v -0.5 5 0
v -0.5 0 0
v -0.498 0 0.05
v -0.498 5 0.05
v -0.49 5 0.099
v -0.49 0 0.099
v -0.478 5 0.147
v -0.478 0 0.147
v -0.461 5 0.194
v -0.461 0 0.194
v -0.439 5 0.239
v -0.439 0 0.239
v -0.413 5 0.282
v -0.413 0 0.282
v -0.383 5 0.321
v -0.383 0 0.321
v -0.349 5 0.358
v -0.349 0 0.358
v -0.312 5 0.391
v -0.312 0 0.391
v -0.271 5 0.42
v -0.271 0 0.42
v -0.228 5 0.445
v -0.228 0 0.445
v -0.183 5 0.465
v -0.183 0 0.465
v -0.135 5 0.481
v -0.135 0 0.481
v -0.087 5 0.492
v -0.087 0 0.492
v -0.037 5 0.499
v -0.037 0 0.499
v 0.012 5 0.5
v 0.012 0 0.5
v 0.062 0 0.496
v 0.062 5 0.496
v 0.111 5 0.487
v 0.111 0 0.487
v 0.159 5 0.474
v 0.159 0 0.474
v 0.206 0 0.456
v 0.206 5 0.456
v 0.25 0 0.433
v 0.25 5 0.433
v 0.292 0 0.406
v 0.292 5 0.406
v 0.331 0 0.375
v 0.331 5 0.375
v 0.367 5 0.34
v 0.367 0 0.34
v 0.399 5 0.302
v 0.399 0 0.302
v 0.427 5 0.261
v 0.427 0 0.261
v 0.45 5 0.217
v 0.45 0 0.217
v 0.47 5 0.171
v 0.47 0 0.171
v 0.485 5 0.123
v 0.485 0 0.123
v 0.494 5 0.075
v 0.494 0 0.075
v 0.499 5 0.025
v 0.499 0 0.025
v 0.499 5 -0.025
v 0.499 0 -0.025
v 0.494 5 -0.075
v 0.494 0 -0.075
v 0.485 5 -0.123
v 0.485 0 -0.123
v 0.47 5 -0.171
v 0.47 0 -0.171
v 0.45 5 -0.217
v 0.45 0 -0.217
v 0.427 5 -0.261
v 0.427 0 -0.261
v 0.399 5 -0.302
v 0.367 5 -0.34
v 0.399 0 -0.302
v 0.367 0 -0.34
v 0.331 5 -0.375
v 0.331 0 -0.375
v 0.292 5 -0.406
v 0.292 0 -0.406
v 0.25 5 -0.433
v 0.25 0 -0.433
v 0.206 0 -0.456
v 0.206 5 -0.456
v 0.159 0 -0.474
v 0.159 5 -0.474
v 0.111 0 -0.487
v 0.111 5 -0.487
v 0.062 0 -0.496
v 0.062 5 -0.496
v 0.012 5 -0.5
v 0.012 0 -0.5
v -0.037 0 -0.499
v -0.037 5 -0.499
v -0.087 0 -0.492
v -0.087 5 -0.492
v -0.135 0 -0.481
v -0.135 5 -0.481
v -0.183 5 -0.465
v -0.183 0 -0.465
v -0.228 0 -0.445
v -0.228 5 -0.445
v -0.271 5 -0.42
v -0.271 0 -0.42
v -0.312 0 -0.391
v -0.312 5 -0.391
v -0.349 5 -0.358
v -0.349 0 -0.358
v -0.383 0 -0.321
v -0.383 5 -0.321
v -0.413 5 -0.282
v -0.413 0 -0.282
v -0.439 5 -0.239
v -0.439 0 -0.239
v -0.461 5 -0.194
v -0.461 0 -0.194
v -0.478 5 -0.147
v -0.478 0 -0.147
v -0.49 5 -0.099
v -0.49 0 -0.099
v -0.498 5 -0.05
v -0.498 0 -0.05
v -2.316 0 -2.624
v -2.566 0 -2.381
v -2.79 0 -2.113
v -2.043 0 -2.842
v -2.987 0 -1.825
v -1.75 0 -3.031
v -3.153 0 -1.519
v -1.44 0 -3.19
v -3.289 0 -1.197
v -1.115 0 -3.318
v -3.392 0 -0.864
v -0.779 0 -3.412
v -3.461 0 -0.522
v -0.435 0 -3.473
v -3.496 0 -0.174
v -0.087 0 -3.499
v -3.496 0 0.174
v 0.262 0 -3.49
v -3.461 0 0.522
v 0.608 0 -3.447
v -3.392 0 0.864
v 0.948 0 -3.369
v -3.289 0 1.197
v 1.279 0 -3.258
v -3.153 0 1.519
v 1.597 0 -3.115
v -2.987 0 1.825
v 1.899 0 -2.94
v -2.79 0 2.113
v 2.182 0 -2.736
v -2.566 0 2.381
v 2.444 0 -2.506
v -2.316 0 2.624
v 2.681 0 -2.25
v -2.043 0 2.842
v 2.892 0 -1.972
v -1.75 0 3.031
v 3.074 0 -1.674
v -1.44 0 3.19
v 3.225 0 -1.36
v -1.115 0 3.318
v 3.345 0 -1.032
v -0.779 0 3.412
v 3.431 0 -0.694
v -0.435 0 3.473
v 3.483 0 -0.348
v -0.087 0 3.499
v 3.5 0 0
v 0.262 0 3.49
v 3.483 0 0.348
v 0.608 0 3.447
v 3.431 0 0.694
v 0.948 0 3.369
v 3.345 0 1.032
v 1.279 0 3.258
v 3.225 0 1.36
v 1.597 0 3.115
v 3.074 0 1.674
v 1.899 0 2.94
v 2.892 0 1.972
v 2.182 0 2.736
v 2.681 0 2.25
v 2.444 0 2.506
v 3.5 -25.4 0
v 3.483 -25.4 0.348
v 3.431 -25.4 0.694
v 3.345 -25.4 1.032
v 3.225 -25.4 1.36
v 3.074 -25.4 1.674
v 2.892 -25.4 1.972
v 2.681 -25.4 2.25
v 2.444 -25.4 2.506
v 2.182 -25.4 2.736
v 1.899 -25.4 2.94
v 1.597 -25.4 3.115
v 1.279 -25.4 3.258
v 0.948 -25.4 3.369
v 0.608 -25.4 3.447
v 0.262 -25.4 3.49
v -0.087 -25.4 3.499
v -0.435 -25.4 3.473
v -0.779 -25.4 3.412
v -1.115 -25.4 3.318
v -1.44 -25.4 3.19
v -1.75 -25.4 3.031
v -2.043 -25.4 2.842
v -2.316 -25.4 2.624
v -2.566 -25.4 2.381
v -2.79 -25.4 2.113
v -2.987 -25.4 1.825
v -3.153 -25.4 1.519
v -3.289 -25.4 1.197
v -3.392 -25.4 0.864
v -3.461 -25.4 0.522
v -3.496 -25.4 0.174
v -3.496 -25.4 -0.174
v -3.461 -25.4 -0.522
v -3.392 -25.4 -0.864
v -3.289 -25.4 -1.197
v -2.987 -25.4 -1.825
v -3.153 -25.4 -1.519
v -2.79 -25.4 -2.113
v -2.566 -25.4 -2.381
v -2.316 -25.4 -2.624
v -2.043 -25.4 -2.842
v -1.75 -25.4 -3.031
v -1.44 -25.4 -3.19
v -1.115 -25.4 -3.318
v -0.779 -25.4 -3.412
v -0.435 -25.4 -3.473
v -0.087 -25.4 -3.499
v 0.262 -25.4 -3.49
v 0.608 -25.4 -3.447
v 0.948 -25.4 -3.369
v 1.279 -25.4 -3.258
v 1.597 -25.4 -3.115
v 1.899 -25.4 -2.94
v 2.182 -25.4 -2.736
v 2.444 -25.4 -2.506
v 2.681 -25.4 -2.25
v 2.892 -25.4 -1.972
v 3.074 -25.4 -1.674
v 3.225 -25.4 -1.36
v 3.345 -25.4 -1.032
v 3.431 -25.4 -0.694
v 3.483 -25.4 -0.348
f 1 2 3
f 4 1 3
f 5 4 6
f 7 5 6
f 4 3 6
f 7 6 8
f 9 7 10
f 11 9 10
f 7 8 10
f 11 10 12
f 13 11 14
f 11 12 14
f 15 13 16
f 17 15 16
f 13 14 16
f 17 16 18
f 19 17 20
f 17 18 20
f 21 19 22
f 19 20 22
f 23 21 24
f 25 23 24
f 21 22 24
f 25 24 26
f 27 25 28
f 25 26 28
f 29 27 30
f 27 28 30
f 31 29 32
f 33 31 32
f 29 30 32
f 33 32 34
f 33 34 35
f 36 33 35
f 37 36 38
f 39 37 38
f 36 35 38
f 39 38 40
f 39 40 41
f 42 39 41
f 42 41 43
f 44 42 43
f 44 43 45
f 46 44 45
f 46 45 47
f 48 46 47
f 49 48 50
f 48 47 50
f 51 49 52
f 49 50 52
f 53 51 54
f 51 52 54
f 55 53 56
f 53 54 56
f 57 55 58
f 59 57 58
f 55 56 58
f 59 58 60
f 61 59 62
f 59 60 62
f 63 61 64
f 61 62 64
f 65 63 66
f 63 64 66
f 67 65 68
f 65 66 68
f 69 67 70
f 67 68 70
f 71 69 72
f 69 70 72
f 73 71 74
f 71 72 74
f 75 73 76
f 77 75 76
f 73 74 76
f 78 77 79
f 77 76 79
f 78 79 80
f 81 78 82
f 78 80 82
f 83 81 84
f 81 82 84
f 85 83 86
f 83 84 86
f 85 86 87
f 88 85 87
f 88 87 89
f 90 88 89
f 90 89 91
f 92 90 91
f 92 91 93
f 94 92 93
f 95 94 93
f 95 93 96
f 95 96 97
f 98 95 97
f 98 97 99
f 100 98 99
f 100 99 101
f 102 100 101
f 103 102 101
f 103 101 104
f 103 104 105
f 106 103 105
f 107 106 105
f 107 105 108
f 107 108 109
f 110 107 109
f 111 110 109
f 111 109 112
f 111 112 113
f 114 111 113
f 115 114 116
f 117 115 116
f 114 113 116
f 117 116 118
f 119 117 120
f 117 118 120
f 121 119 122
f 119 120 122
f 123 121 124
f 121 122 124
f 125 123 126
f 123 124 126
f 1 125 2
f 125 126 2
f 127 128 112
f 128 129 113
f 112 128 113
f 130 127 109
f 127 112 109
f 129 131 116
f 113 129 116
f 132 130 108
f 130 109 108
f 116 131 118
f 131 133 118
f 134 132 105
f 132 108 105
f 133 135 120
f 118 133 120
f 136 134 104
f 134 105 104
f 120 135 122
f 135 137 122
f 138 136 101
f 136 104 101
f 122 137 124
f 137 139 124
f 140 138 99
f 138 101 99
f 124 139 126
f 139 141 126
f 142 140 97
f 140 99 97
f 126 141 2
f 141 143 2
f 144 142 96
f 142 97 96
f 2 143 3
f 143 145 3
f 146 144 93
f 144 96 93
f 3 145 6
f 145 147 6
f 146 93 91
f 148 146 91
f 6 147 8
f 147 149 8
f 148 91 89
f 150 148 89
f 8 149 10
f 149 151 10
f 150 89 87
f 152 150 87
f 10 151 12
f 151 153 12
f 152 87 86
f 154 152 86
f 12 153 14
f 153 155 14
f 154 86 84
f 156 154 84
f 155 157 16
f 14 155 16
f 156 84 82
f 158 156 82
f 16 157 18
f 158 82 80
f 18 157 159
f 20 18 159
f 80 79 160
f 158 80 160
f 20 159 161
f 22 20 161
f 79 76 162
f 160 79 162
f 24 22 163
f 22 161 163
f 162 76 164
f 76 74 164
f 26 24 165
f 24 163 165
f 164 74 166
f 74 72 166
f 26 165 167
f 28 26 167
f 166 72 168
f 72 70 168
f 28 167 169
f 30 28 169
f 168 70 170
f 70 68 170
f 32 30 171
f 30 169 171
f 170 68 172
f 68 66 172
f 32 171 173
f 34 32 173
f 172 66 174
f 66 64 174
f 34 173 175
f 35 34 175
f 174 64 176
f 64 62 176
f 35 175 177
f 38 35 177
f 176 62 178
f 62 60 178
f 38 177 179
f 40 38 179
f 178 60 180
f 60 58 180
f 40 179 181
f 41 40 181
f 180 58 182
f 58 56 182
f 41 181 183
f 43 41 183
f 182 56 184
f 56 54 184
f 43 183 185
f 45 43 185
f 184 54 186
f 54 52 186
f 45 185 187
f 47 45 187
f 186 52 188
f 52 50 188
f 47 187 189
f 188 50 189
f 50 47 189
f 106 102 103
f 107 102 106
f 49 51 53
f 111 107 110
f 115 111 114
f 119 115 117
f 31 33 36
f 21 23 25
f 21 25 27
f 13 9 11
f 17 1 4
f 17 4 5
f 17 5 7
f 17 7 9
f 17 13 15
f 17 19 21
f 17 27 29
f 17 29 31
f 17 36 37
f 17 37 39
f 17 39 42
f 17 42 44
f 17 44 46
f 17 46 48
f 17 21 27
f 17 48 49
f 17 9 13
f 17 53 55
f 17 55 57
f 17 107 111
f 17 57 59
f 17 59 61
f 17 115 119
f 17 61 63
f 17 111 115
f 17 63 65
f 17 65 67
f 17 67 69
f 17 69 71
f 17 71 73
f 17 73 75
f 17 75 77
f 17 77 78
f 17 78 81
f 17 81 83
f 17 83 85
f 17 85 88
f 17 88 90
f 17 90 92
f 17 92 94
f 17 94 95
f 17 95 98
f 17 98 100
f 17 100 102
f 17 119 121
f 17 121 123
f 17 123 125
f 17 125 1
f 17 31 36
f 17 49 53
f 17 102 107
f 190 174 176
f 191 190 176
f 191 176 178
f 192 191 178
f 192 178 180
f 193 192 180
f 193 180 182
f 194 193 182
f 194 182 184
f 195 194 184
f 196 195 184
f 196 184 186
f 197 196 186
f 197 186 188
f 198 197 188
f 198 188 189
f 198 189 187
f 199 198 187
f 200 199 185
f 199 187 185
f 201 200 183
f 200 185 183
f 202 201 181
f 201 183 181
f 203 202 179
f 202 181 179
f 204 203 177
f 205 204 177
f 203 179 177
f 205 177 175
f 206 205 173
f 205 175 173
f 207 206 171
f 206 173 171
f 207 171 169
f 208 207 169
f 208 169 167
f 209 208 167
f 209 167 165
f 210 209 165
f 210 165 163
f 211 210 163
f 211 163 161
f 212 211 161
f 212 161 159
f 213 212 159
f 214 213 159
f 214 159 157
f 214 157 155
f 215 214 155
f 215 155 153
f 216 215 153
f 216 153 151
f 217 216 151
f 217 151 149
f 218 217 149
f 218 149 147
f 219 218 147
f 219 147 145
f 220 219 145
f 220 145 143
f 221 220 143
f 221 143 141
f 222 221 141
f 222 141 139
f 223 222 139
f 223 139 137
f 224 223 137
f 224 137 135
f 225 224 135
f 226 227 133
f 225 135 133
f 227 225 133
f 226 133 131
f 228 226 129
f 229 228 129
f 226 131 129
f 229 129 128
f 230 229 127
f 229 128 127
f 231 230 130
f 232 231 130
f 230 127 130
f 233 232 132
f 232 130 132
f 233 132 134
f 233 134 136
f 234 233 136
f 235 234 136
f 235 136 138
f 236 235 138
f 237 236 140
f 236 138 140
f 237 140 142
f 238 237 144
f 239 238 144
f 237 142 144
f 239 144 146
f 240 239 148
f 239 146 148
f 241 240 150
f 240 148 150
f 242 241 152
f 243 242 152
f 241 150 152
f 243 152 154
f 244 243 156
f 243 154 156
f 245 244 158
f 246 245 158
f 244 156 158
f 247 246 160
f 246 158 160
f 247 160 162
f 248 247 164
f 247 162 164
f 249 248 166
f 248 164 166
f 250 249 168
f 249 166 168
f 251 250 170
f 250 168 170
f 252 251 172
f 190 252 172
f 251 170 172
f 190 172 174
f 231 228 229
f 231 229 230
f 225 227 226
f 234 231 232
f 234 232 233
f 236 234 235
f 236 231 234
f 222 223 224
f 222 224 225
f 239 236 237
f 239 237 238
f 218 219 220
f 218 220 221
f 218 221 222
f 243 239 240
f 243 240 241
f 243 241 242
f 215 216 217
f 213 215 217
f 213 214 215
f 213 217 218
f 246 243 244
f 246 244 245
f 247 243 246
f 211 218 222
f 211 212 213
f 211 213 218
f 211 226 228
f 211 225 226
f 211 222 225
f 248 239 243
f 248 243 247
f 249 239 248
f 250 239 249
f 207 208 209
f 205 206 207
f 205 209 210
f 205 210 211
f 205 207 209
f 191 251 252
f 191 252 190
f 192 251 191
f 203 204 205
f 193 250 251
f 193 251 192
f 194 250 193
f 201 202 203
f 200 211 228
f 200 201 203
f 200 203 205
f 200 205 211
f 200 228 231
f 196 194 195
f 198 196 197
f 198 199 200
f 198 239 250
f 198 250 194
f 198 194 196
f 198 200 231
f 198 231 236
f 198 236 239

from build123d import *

# Parameters (mm, degrees)
F1_R     = 3.5
F2_DEPTH = 15
F3_R     = 0.5
F4_DEPTH = 5
F0_R     = 3.5
F5_DEPTH = 25.4
F6_R     = 0.5
F7_DEPTH = 5


with BuildPart() as f2:
    # F1 (on face) → F2 (new body)
    with BuildSketch(Plane.XZ):
        Circle(F1_R)
    extrude(amount=F2_DEPTH)

    # F3 (on face) → F4 (join)
    with BuildSketch(Plane.XZ):
        Circle(F3_R)
    extrude(amount=F4_DEPTH)

    # F0 (on Front) → F5 (join)
    with BuildSketch(Plane.XZ):
        Circle(F0_R)
    extrude(amount=F5_DEPTH)

    # F6 (on face) → F7 (join)
    with BuildSketch(Plane(origin=(0, 0, 0), x_dir=(-1, 0, 0), z_dir=(0, 1, 0))):
        Circle(F6_R)
    extrude(amount=F7_DEPTH)


solid = f2.part
